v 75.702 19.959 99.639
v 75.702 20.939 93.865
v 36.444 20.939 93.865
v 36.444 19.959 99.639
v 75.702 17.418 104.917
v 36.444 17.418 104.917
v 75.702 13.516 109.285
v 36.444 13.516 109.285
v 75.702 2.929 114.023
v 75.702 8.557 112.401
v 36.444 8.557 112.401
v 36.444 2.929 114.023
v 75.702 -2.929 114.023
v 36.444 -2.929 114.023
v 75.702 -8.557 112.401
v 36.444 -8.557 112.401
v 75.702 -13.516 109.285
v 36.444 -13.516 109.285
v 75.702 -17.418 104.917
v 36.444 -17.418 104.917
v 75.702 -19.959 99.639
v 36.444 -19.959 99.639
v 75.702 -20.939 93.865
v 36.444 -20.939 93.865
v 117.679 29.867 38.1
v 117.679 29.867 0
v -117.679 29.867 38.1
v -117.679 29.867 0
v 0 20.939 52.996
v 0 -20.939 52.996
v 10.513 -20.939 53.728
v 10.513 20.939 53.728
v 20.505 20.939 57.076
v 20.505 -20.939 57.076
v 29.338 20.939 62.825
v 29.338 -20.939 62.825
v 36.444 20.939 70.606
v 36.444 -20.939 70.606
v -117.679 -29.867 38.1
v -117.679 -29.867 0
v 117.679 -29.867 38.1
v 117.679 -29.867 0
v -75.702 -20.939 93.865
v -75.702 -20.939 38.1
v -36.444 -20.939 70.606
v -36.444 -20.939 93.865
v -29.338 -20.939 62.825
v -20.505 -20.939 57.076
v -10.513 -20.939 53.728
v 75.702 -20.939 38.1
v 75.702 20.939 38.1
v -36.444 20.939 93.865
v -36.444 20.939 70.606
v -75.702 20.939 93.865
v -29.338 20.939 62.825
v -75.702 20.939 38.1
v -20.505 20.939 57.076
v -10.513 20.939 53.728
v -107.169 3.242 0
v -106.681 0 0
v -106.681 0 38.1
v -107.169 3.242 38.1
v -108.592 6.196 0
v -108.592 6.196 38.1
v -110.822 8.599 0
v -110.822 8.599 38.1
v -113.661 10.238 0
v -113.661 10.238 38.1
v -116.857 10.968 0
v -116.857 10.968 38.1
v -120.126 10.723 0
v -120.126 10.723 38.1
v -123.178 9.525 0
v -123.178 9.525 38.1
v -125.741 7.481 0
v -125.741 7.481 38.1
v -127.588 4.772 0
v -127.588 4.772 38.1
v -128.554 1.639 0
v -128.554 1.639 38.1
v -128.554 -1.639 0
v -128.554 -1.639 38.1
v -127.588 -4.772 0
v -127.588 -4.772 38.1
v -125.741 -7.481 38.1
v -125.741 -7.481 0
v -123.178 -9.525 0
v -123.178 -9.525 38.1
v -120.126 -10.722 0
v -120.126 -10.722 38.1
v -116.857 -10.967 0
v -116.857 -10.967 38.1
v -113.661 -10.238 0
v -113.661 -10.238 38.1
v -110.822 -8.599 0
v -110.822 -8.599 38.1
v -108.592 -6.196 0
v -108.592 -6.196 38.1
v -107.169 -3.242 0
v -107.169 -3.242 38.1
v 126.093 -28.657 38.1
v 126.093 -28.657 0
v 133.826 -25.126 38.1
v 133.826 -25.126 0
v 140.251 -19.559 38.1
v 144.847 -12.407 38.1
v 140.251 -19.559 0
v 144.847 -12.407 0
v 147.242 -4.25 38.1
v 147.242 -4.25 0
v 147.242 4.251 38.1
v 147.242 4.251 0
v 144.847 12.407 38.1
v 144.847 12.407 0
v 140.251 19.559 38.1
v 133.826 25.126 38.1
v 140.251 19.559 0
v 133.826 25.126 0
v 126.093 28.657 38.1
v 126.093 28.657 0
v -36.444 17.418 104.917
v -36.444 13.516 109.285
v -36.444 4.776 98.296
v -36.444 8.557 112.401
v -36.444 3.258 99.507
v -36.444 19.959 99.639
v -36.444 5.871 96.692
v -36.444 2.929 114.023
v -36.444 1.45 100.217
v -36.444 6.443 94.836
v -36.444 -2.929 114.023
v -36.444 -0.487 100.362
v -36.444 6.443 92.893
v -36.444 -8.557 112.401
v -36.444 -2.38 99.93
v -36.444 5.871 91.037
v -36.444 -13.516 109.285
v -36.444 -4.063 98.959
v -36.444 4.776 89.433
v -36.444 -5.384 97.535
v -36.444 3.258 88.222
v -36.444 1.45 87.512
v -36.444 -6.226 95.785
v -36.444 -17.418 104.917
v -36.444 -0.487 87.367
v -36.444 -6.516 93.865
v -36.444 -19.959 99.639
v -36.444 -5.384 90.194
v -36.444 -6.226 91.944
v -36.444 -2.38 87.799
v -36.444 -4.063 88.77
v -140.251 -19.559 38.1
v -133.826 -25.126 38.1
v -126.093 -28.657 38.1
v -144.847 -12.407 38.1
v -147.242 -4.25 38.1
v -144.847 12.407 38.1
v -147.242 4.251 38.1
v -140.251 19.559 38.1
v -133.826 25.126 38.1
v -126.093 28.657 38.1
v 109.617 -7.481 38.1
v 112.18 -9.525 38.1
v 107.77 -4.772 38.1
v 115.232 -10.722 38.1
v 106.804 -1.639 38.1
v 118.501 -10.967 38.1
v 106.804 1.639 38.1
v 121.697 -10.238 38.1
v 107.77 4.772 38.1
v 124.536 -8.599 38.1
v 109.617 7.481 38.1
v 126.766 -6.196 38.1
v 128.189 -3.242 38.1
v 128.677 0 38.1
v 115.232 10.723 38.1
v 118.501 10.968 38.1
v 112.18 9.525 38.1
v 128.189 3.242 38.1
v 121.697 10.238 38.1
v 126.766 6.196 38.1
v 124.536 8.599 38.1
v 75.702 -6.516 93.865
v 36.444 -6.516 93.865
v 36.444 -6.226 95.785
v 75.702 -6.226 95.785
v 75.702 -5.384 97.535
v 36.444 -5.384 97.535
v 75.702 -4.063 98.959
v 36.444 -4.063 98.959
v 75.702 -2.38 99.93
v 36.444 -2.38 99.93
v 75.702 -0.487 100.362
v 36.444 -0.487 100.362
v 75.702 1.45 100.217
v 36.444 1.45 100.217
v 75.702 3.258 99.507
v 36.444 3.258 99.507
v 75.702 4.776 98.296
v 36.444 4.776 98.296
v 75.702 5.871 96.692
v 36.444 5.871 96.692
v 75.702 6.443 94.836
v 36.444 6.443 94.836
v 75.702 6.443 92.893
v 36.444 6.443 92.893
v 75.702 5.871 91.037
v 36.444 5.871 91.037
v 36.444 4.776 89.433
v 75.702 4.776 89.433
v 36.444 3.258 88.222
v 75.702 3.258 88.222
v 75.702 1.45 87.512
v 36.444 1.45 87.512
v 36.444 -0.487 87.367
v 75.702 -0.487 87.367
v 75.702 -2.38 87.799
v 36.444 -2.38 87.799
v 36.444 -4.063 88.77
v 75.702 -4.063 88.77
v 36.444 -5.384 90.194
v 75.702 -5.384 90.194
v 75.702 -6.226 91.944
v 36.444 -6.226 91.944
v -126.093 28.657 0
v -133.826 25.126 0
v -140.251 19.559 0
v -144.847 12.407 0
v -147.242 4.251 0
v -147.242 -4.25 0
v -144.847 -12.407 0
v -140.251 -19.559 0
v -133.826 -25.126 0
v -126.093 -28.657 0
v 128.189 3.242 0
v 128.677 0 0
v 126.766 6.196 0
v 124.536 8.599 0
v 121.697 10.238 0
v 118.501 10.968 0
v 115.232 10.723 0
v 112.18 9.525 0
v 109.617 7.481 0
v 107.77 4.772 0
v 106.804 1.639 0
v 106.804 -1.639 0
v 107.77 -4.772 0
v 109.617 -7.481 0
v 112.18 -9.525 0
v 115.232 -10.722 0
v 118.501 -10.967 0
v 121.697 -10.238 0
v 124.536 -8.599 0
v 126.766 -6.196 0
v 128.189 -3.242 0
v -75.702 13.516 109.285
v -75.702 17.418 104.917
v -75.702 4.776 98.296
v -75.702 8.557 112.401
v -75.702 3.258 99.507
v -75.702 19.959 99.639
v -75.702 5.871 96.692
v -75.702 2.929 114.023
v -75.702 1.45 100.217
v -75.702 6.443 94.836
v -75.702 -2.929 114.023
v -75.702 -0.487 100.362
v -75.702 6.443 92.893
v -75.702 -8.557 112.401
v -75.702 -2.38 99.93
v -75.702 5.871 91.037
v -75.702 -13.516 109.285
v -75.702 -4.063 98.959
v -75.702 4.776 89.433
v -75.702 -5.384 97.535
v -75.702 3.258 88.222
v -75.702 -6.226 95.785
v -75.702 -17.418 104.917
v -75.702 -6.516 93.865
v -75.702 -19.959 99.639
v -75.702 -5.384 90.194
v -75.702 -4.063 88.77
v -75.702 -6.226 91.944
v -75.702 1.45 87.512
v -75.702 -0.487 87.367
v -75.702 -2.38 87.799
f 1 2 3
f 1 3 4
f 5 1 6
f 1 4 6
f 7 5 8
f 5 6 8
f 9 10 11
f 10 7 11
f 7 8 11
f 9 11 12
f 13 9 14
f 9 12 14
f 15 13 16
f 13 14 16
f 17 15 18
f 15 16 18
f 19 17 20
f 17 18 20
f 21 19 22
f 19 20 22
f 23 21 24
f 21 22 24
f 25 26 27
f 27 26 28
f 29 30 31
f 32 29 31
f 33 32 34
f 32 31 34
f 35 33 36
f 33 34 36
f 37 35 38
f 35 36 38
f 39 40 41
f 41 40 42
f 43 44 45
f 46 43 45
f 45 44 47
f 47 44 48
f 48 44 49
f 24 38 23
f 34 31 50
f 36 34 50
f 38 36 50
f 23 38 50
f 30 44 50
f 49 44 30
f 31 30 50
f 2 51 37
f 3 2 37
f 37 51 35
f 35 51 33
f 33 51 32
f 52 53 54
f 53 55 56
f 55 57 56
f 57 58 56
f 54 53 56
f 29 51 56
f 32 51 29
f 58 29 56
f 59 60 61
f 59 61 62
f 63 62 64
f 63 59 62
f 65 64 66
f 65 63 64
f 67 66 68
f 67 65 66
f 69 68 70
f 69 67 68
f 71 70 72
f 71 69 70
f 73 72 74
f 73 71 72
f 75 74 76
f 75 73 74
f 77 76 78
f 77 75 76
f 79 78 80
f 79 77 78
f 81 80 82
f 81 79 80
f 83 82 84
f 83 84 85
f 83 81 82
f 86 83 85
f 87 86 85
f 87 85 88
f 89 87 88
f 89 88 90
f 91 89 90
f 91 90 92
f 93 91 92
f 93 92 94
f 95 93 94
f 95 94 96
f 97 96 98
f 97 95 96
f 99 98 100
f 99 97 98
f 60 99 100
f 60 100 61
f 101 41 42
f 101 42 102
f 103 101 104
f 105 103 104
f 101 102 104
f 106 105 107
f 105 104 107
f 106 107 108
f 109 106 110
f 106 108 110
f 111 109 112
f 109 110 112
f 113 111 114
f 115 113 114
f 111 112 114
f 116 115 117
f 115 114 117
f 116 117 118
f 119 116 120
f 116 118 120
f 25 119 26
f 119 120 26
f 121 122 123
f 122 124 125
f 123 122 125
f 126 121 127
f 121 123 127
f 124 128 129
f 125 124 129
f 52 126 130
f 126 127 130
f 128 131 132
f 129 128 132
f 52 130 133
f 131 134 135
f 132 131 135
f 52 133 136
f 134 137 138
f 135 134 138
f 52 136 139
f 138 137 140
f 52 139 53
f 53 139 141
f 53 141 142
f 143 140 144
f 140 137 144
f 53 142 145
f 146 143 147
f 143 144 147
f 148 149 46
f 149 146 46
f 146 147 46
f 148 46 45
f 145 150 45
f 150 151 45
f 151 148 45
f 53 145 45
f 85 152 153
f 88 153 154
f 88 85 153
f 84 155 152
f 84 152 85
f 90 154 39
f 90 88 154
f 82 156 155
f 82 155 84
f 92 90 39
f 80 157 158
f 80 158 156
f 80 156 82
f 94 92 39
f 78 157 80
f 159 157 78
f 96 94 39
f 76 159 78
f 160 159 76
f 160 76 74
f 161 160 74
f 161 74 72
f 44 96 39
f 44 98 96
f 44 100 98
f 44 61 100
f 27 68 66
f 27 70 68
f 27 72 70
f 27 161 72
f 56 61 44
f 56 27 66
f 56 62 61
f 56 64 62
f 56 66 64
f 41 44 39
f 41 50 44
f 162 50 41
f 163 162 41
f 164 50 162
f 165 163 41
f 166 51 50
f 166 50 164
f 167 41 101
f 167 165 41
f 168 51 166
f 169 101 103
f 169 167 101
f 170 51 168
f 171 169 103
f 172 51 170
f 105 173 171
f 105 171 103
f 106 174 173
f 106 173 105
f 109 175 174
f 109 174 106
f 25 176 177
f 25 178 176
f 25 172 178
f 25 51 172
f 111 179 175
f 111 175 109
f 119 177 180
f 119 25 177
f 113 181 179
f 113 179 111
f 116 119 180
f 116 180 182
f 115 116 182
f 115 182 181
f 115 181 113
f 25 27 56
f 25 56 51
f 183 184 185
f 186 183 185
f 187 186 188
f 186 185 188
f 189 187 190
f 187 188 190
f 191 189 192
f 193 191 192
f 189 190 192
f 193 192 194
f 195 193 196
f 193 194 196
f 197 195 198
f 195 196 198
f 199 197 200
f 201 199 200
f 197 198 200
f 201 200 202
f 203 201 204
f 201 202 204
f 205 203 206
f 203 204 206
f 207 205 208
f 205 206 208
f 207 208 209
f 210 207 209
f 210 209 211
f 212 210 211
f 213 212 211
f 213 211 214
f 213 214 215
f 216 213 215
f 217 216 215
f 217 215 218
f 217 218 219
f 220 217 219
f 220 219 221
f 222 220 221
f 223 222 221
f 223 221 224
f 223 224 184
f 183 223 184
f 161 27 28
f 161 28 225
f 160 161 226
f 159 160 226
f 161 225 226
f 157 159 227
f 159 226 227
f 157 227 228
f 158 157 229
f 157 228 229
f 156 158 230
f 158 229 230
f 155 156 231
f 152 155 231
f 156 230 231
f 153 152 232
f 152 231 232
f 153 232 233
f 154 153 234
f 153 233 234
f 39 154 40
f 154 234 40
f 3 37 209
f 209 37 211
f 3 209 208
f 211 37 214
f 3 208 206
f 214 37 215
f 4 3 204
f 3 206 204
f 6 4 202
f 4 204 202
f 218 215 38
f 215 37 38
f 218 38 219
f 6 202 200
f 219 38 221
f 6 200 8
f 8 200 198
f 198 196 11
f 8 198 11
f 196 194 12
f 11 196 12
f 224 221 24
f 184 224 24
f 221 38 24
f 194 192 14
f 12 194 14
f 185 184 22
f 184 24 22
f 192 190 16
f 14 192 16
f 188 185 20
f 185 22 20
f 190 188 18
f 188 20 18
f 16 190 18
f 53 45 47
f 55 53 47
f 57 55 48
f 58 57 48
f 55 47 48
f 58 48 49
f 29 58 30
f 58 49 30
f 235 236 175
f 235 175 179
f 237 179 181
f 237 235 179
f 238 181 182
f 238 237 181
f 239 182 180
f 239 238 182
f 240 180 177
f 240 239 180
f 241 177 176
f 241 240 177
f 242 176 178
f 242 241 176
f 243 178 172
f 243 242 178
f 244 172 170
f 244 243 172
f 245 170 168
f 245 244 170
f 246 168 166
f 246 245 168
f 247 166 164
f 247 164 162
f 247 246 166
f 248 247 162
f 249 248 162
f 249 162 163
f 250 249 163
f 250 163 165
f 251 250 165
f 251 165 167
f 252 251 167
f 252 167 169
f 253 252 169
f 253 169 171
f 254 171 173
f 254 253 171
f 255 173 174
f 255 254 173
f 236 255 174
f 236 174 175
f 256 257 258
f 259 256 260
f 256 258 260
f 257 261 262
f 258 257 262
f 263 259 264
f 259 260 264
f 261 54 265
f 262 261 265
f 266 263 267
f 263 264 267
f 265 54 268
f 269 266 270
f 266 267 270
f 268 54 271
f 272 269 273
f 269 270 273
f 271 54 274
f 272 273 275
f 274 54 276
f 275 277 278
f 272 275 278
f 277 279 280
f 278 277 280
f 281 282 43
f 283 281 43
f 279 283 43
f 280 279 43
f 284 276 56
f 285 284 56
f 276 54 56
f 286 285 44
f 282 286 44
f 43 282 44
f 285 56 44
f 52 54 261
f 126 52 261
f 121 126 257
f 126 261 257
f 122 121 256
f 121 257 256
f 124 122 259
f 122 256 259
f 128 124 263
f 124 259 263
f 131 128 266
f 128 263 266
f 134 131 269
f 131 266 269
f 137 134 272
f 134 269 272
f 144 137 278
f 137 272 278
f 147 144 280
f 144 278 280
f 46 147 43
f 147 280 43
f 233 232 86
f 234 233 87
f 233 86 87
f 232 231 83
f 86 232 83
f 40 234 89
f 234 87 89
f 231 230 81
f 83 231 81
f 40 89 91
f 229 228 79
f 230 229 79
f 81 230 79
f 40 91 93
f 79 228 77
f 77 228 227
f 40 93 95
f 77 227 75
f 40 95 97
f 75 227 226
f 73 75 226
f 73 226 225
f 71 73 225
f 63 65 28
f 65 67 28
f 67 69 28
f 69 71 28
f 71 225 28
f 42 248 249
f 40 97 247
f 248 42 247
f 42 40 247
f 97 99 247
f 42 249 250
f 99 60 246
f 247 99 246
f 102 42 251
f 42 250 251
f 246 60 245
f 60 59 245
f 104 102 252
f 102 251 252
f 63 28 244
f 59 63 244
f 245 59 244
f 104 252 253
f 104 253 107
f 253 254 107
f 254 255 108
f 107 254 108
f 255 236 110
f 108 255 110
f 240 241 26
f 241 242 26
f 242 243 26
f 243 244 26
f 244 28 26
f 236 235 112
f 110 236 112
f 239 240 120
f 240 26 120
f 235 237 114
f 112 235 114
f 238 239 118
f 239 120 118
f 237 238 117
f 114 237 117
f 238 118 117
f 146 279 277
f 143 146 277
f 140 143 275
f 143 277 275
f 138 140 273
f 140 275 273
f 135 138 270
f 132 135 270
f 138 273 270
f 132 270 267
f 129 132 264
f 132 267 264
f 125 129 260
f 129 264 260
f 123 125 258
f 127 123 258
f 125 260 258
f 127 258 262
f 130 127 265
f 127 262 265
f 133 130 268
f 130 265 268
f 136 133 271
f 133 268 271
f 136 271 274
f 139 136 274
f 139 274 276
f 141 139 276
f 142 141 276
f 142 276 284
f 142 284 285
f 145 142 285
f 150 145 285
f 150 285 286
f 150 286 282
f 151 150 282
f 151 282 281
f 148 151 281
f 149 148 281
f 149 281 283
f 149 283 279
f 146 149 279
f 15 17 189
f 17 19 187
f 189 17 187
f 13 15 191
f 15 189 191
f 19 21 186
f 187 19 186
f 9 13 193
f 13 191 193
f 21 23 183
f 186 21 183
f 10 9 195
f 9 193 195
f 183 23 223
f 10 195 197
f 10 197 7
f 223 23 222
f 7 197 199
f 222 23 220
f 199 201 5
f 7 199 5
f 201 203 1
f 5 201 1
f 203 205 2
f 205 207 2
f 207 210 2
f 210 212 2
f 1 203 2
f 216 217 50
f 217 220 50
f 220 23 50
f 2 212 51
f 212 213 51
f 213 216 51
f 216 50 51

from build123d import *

# Parameters (mm, degrees)
F0_R     = 10.99825
F1_DEPTH = 38.1
F3_DEPTH = 76.2
F4_R     = 6.515774
F5_DEPTH = 223.248987
F7_DEPTH = 50.806747


with BuildPart() as f1:
    # F0 (on Top) → F1 (new body)
    with BuildSketch(Plane.XY):
        with BuildLine():
            Line((117.679015, 29.866867), (0, 29.866867))
            Line((0, 29.866867), (-117.679015, 29.866867))
            ThreePointArc((-117.679015, 29.866867), (-147.545878, 4e-06), (-117.679015, -29.866859))
            Line((-117.679015, -29.866859), (0, -29.866859))
            Line((0, -29.866859), (117.679015, -29.866859))
            ThreePointArc((117.679015, -29.866859), (147.545878, 4e-06), (117.679015, 29.866867))
        make_face()
        with Locations((-117.679015, 4e-06)):
            Circle(F0_R, mode=Mode.SUBTRACT)
        with Locations((117.679015, 4e-06)):
            Circle(F0_R, mode=Mode.SUBTRACT)
    extrude(amount=F1_DEPTH)

    # F2 (on face) → F3 (join)
    with BuildSketch(Plane.XY.offset(38.1)):
        Polygon((0, 20.938881), (-75.702109, 20.938881), (-75.702109, -20.938881), (0, -20.938881), (75.702109, -20.938881), (75.702109, 20.938881), align=None)
    extrude(amount=F3_DEPTH)

    # F4 (on face) → F5 (cut, through all)
    with BuildSketch(Plane(origin=(-75.702109, 0, 0), x_dir=(0, -1, 0), z_dir=(-1, 0, 0))):
        with Locations((0, 93.864545)):
            Circle(F4_R)
        with BuildLine():
            ThreePointArc((-20.938881, 93.864545), (0, 114.228876), (20.938881, 93.864545))
            Line((20.938881, 93.864545), (20.938881, 114.3))
            Line((20.938881, 114.3), (-20.938881, 114.3))
            Line((-20.938881, 114.3), (-20.938881, 93.864545))
        make_face()
    extrude(amount=-F5_DEPTH, mode=Mode.SUBTRACT)

    # F6 (on face) → F7 (cut, through all)
    with BuildSketch(Plane.XZ.offset(20.938881)):
        with BuildLine():
            Line((36.444344, 70.606232), (36.444344, 114.3))
            Line((36.444344, 114.3), (-36.444344, 114.3))
            Line((-36.444344, 114.3), (-36.444344, 70.606232))
            ThreePointArc((-36.444344, 70.606232), (-20.505249, 57.076184), (0, 52.995533))
            ThreePointArc((0, 52.995533), (20.505249, 57.076184), (36.444344, 70.606232))
        make_face()
    extrude(amount=-F7_DEPTH, mode=Mode.SUBTRACT)


solid = f1.part
